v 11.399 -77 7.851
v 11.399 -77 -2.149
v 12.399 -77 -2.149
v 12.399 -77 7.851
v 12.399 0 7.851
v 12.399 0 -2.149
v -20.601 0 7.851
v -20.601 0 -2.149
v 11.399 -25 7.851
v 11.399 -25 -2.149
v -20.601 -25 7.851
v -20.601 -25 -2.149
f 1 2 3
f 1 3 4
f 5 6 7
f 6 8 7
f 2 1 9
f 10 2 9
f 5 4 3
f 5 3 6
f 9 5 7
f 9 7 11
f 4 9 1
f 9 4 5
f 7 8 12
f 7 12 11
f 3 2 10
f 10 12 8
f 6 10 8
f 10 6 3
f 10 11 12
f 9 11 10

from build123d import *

# Parameters (mm, degrees)
F0_W     = 32
F0_H     = 10
F1_DEPTH = 25
F2_W     = 52
F2_H     = 10
F2_W_2   = 25
F3_DEPTH = 1


with BuildPart() as f1:
    # F0 (on Front) → F1 (new body)
    with BuildSketch(Plane.XZ):
        with Locations((-4.601419, 2.851491)):
            Rectangle(F0_W, F0_H)
    extrude(amount=F1_DEPTH)

    # F2 (on face) → F3 (join)
    with BuildSketch(Plane.YZ.offset(11.398581)):
        with Locations((-51, 2.851491)):
            Rectangle(F2_W, F2_H)
        with Locations((-12.5, 2.851491)):
            Rectangle(F2_W_2, F2_H)
    extrude(amount=F3_DEPTH)


solid = f1.part
